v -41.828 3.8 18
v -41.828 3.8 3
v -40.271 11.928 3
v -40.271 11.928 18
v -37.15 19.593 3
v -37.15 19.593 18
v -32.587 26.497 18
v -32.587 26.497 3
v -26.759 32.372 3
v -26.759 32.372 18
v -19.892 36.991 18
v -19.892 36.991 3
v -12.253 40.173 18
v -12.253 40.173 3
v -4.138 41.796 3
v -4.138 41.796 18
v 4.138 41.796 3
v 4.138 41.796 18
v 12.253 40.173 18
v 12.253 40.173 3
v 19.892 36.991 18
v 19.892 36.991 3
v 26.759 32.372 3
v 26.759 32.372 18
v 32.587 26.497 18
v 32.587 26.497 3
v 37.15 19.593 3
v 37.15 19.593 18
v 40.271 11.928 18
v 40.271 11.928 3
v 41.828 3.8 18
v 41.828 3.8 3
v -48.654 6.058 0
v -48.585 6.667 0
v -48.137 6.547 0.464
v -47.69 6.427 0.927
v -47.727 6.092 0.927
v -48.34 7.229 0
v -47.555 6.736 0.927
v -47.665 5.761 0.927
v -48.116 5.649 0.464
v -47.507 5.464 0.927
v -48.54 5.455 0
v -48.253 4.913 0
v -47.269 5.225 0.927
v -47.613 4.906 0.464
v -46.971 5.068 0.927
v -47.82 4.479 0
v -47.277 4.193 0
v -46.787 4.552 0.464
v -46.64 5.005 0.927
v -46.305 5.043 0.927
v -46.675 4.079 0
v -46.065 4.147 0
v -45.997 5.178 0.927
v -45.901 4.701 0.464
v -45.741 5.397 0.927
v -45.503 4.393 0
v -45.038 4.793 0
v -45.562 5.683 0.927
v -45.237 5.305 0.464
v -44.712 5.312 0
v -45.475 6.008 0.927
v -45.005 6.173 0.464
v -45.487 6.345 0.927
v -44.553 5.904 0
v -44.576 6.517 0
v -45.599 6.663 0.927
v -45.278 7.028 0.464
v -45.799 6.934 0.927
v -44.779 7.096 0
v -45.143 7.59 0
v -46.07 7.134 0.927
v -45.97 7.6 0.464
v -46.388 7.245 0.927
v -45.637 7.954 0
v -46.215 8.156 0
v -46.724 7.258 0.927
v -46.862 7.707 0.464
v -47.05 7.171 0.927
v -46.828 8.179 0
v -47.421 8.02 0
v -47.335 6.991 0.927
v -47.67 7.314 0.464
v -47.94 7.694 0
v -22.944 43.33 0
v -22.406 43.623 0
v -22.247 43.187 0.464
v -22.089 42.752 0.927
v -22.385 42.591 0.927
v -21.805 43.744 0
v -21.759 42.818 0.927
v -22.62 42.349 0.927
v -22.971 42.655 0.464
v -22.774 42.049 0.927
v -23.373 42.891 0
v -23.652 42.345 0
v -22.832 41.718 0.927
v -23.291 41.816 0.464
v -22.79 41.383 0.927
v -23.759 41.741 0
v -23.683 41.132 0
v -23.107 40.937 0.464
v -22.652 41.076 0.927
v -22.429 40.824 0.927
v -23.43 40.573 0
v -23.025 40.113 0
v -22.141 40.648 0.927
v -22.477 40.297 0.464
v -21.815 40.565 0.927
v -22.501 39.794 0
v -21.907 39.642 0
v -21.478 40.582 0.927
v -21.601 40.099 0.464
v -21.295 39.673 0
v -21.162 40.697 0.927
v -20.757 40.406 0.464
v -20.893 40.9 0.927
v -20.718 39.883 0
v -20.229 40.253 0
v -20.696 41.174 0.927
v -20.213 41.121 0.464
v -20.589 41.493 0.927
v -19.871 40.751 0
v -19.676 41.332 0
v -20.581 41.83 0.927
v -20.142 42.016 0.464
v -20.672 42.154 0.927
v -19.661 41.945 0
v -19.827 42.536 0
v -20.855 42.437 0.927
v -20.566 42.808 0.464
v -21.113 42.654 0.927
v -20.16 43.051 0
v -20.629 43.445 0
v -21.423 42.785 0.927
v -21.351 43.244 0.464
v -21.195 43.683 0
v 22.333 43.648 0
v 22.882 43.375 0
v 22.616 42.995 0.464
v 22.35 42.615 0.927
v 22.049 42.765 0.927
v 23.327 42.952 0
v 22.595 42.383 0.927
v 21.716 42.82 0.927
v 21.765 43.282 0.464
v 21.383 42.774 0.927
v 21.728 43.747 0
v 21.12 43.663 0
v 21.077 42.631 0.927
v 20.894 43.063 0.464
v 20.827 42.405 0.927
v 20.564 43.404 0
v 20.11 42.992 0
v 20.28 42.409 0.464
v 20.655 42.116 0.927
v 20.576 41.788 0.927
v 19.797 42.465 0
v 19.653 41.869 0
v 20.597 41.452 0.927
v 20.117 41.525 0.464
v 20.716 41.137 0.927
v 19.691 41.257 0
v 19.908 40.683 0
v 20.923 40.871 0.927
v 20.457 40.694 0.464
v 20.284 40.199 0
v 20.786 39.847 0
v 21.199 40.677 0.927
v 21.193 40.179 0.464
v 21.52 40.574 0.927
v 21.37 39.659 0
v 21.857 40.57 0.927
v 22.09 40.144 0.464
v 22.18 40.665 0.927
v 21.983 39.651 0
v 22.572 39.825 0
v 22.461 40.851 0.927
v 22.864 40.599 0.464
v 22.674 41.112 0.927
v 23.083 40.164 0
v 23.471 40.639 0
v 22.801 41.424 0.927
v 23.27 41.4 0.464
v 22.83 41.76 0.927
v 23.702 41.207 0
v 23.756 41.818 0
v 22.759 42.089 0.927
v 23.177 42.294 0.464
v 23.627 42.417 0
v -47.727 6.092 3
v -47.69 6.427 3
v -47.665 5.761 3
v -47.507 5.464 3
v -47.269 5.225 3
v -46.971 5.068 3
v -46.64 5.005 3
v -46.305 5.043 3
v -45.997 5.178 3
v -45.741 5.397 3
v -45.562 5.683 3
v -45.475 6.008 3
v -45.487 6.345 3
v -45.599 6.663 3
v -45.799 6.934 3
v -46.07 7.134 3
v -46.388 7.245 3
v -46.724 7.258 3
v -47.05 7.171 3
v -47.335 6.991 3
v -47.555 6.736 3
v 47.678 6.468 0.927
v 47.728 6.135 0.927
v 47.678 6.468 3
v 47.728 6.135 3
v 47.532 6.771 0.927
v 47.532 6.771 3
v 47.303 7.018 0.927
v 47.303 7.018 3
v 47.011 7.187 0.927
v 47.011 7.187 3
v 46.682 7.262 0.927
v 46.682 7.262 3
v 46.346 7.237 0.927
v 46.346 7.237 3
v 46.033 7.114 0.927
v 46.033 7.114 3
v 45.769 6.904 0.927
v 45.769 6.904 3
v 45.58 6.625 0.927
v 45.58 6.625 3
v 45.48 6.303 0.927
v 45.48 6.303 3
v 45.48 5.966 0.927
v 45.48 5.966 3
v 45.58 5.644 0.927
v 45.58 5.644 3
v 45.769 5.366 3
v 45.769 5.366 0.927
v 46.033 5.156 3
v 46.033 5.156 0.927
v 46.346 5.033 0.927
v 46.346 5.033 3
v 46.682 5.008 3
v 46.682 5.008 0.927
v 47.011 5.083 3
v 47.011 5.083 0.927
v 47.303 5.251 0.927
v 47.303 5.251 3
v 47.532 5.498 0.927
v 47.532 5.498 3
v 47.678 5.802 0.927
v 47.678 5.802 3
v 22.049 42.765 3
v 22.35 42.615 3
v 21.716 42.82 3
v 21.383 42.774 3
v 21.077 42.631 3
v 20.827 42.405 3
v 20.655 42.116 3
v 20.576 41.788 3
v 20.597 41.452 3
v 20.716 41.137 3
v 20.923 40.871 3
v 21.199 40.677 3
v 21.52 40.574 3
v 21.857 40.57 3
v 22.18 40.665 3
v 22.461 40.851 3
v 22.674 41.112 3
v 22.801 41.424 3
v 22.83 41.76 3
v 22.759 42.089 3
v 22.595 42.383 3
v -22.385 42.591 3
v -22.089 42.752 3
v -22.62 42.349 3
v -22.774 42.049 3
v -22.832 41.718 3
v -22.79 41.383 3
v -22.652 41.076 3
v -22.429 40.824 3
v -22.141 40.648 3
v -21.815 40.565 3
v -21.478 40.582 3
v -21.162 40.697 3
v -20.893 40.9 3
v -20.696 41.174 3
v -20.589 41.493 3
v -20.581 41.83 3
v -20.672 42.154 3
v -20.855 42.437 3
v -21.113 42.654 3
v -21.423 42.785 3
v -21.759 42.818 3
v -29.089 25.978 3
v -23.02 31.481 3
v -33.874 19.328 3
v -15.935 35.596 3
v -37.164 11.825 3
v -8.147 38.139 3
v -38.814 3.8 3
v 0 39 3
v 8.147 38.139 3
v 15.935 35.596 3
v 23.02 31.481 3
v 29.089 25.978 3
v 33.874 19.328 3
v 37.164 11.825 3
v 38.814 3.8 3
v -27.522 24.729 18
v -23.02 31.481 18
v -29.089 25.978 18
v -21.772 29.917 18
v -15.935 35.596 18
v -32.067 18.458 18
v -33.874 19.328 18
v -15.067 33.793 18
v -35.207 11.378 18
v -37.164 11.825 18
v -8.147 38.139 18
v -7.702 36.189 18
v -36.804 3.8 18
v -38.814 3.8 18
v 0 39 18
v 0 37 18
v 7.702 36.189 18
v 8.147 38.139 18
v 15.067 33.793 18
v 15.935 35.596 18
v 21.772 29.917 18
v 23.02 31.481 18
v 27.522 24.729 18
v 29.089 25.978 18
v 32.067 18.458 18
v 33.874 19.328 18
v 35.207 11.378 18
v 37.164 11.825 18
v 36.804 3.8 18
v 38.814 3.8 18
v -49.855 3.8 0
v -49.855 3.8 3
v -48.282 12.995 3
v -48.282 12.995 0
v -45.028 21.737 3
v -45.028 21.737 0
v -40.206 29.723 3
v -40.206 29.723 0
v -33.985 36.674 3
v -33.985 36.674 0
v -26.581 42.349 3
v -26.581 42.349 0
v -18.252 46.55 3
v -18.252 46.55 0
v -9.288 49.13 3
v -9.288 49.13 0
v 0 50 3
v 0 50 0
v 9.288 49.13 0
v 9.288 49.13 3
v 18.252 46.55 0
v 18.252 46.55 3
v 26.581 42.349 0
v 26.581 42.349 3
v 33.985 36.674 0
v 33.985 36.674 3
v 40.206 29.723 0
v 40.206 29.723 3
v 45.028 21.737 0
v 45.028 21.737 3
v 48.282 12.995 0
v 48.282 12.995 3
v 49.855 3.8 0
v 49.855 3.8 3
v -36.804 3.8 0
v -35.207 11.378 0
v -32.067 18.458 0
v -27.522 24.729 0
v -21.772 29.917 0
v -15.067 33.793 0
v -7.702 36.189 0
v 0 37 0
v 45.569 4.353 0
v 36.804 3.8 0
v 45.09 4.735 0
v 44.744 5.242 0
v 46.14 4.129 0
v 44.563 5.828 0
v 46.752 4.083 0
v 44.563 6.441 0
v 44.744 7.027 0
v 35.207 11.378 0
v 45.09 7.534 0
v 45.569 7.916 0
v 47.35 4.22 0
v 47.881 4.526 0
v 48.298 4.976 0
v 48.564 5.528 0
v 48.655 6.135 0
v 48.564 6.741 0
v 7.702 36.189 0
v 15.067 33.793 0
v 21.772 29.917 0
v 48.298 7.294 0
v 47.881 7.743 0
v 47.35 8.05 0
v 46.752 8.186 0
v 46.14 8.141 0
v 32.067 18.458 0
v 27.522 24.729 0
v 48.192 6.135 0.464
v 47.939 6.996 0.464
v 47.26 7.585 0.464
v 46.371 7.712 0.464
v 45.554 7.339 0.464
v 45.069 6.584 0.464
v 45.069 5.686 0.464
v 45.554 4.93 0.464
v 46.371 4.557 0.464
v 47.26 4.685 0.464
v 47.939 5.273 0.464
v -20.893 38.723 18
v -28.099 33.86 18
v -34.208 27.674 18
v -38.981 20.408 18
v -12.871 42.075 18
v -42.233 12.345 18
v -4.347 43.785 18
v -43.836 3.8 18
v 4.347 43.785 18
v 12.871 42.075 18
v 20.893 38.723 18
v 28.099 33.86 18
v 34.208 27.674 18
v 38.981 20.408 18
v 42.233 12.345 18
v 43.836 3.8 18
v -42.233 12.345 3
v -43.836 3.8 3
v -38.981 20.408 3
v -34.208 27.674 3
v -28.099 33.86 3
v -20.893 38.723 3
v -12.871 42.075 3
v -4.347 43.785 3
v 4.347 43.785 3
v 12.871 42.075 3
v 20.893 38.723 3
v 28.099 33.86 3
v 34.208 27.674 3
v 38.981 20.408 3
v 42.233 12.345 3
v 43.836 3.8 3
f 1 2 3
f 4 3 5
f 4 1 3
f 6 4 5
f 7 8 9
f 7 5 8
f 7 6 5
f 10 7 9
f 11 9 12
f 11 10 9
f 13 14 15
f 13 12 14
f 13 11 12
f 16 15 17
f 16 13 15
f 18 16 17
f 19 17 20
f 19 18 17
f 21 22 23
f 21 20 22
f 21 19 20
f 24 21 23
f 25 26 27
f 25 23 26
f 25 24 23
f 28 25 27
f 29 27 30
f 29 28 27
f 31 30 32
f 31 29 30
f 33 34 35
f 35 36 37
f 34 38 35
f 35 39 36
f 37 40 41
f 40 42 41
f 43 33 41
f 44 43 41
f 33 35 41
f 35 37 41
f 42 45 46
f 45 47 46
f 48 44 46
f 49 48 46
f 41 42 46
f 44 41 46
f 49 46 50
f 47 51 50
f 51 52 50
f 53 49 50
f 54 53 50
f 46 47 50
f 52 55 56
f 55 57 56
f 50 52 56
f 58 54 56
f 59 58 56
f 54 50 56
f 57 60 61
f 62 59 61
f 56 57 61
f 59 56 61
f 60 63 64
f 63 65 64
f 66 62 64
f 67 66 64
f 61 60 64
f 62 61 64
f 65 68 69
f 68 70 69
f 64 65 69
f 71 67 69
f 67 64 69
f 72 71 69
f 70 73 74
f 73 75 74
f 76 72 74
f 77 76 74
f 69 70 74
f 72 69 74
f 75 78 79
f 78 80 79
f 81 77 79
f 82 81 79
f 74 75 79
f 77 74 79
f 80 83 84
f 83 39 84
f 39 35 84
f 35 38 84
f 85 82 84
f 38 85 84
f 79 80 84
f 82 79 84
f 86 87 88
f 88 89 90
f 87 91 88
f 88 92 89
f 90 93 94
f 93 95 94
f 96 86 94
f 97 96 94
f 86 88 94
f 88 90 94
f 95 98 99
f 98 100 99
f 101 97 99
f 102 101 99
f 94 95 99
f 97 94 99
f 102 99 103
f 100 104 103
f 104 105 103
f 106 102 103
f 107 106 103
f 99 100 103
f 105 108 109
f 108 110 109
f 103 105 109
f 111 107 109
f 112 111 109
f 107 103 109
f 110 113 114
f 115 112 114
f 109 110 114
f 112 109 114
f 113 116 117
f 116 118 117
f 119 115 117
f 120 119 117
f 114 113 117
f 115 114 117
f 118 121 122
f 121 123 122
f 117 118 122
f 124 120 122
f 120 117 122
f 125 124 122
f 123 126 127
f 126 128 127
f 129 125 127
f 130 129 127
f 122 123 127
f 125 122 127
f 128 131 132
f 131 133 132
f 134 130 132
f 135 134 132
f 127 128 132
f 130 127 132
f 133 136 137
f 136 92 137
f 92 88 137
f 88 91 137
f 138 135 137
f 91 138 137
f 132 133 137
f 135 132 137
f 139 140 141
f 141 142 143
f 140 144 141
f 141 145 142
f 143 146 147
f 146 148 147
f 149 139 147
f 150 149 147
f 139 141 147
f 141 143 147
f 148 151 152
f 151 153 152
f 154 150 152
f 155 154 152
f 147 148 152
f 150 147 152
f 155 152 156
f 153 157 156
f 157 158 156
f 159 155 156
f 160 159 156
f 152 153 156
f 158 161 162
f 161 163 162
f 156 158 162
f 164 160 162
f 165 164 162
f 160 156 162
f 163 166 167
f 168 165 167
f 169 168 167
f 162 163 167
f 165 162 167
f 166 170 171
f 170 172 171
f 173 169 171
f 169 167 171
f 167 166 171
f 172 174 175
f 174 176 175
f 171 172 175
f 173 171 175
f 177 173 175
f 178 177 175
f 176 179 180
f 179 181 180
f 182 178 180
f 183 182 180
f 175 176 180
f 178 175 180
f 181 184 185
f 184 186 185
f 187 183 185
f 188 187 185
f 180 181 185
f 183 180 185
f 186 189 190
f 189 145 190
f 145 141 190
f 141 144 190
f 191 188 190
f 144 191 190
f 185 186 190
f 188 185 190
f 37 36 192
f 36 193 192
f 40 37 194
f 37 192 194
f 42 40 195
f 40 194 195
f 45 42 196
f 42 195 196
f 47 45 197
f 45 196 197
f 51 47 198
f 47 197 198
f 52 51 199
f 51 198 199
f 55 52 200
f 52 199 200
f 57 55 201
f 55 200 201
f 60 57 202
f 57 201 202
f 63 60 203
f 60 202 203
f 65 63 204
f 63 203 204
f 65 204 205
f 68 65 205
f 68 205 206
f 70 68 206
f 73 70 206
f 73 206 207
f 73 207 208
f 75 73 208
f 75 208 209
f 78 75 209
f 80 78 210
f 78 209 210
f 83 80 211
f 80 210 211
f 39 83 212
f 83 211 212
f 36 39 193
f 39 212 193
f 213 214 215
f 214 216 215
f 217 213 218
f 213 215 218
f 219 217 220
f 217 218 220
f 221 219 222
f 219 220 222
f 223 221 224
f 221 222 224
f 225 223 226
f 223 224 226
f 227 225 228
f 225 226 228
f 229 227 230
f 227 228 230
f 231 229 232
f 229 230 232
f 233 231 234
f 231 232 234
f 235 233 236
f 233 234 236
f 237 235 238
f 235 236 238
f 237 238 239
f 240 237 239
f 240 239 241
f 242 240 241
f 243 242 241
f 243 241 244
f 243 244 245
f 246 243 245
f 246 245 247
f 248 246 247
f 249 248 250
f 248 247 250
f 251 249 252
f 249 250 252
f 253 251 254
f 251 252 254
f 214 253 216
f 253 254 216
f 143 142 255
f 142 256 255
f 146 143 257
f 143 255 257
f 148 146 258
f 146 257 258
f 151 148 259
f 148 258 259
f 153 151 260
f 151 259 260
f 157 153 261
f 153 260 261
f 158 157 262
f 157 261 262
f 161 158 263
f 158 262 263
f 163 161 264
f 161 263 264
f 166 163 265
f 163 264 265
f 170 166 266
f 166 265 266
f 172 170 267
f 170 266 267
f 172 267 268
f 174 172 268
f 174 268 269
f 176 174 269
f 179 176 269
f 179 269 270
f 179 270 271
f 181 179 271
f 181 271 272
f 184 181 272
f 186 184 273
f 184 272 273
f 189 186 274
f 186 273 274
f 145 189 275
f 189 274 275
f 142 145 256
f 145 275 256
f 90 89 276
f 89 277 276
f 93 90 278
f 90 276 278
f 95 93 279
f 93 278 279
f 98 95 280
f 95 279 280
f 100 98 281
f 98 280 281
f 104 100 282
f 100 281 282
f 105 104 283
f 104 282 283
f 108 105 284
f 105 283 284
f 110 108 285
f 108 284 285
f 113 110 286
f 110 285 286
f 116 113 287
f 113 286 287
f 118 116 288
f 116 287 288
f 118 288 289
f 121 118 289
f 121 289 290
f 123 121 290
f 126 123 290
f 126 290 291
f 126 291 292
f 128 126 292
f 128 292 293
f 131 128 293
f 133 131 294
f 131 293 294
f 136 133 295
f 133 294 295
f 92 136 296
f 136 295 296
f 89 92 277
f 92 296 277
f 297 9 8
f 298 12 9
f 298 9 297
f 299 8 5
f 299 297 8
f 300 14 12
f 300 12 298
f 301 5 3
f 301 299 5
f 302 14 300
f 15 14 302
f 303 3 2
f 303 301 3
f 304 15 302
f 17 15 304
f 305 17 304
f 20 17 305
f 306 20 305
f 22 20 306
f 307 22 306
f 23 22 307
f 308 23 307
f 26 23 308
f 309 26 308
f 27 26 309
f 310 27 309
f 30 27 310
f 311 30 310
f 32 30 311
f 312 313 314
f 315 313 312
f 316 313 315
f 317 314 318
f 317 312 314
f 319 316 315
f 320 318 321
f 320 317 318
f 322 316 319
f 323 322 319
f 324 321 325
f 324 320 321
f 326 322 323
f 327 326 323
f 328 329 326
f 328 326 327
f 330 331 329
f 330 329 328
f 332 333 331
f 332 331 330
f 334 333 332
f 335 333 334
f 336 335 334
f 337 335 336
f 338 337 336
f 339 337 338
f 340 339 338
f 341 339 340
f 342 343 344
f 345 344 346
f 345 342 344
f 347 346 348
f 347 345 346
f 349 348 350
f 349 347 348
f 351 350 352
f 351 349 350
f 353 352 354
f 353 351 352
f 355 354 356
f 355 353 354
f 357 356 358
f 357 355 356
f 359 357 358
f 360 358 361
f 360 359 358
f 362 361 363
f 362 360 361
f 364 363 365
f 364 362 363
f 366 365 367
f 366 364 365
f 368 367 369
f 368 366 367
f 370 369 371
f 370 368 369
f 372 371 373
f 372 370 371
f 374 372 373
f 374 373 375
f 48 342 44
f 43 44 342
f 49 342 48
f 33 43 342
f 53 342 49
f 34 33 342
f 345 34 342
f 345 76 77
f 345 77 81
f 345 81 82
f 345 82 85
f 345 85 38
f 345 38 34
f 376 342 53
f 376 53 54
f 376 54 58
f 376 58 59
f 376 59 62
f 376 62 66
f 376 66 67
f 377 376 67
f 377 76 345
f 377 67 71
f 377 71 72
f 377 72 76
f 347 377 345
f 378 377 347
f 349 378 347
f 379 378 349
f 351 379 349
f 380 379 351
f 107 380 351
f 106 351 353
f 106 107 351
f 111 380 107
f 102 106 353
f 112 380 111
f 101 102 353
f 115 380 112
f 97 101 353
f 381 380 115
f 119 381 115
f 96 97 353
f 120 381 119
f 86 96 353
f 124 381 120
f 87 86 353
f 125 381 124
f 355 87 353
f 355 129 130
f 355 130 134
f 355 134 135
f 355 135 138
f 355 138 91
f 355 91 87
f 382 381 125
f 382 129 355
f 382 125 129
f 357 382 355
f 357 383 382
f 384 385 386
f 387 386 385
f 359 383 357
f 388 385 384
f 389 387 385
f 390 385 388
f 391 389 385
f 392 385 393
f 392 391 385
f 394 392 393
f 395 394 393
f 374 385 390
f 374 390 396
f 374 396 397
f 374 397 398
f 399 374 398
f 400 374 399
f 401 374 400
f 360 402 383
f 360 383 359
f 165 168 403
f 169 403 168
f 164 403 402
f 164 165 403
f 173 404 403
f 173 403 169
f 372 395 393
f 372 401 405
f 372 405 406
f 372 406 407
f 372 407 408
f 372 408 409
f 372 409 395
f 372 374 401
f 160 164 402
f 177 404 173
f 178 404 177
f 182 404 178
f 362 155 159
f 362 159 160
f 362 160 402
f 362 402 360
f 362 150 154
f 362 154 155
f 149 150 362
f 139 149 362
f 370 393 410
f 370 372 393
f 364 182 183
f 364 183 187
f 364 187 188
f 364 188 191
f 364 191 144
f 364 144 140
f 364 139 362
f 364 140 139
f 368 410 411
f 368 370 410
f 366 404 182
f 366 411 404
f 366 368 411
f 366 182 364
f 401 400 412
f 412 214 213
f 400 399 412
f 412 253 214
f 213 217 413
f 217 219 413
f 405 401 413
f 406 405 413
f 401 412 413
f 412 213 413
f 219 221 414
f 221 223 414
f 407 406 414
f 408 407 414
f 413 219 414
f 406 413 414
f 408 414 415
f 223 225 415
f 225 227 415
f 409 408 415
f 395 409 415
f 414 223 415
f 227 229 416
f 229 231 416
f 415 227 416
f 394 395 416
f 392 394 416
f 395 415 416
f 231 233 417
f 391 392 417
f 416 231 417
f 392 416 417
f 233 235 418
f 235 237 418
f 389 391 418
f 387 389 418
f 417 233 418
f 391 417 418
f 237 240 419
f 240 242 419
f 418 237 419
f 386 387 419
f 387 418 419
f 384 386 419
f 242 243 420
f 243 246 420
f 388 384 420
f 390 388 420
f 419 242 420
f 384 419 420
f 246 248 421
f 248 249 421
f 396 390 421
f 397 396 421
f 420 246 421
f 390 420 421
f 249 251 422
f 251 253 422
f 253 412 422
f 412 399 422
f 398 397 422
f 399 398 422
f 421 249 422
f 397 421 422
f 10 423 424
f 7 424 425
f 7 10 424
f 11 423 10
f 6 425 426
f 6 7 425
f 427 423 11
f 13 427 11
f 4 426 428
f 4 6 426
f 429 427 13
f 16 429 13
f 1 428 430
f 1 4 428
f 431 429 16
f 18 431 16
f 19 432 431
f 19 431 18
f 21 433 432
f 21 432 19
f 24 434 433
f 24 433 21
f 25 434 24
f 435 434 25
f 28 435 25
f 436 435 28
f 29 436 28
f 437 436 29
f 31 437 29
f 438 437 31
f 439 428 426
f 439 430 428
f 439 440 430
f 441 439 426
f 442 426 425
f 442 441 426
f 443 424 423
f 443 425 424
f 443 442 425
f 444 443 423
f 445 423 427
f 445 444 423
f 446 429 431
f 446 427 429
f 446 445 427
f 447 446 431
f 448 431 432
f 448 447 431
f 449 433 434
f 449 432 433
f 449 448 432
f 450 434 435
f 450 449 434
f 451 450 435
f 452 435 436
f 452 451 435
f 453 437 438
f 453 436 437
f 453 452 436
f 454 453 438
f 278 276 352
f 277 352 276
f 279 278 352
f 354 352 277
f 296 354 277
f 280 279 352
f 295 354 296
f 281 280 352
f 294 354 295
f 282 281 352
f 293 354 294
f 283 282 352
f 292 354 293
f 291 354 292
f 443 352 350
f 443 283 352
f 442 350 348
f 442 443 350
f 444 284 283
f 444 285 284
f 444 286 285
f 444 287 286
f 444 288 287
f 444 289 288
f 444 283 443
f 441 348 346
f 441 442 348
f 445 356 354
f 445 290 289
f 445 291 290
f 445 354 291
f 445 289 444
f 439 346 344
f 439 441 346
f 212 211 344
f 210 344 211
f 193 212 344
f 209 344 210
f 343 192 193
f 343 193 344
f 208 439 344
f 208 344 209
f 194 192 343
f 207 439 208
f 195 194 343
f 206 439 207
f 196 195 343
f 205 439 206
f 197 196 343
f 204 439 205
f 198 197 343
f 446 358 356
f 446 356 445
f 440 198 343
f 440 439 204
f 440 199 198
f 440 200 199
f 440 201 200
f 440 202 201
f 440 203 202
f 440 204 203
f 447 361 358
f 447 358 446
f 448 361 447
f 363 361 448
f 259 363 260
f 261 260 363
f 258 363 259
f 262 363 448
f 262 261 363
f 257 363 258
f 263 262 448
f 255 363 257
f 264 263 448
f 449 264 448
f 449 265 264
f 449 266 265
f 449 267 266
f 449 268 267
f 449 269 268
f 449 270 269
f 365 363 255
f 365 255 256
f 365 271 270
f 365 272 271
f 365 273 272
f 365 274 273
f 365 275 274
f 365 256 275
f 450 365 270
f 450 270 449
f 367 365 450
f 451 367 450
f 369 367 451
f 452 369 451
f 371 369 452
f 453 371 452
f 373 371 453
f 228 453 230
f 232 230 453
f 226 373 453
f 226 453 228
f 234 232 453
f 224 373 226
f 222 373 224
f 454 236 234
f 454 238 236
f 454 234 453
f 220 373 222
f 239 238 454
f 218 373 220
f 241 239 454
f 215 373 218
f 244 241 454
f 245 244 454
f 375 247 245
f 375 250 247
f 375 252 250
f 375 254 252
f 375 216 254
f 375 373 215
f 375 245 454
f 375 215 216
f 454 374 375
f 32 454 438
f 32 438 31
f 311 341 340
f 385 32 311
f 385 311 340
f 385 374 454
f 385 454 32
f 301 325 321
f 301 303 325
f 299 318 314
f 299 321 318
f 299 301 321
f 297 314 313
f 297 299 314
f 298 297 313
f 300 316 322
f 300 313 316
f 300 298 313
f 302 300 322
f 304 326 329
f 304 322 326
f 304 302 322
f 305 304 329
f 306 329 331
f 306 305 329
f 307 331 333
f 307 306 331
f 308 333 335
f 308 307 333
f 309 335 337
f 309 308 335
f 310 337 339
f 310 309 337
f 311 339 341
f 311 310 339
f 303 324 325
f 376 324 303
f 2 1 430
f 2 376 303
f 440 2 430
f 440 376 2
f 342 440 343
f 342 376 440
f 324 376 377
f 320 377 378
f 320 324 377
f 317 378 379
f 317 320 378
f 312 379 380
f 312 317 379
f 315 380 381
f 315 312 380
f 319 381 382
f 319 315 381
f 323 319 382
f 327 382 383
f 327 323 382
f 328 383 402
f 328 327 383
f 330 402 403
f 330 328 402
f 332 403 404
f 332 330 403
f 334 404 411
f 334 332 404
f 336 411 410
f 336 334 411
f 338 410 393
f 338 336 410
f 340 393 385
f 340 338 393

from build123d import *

# Parameters (mm, degrees)
REVOLVE1_ANGLE                  = 180
SKETCH2_W                       = 162.072956604
SKETCH2_H                       = 3.8
CUT_EXTRUDE1_DEPTH              = 19
F_4_40_TAPPED_HOLE1_D           = 2.2606
F_4_40_TAPPED_HOLE1_CSINK_D     = 4.1148
F_4_40_TAPPED_HOLE1_CSINK_ANGLE = 90
CIRPATTERN1_COUNT               = 4
CIRPATTERN1_ANGLE               = 165


with BuildPart() as part:
    # Sketch1 → Revolve1 (revolve, symmetric)
    with BuildSketch(Plane(origin=(0, 0, 0), x_dir=(0, 0, -1), z_dir=(1, 0, 0))) as revolve1_sk:
        Polygon((0, 37), (-18, 37), (-18, 39), (-3, 39), (-3, 42), (-18, 42), (-18, 44), (-3, 44), (-3, 50), (0, 50), align=None)
    revolve(axis=Axis((0, 0, 0), (0, 0, 1)), revolution_arc=REVOLVE1_ANGLE / 2)
    revolve(revolve1_sk.sketch, axis=Axis((0, 0, 0), (0, 0, -1)), revolution_arc=REVOLVE1_ANGLE / 2)

    # Sketch2 → Cut-Extrude1 (cut, through all)
    with BuildSketch(Plane(origin=(0, 0, 0), x_dir=(-1, 0, 0), z_dir=(0, 0, -1))):
        with Locations((0, 1.9)):
            Rectangle(SKETCH2_W, SKETCH2_H)
    extrude(amount=-CUT_EXTRUDE1_DEPTH, mode=Mode.SUBTRACT)

    # #4-40 Tapped Hole1 (through all)
    with Locations(Plane(origin=(0, 0, 0), x_dir=(-1, 0, 0), z_dir=(0, 0, -1))):
        with Locations((-46.597908485, 6.134731034)):
            f_4_40_tapped_hole1 = CounterSinkHole(F_4_40_TAPPED_HOLE1_D / 2, F_4_40_TAPPED_HOLE1_CSINK_D / 2, counter_sink_angle=F_4_40_TAPPED_HOLE1_CSINK_ANGLE)

    # CirPattern1: #4-40 Tapped Hole1 ×4 about axis
    cirpattern1_axis = Axis((0, 0, 0), (0, 0, 1))
    for i in range(1, CIRPATTERN1_COUNT):
        add(f_4_40_tapped_hole1.rotate(cirpattern1_axis, i * CIRPATTERN1_ANGLE / (CIRPATTERN1_COUNT - 1)), mode=Mode.SUBTRACT)


solid = part.part
